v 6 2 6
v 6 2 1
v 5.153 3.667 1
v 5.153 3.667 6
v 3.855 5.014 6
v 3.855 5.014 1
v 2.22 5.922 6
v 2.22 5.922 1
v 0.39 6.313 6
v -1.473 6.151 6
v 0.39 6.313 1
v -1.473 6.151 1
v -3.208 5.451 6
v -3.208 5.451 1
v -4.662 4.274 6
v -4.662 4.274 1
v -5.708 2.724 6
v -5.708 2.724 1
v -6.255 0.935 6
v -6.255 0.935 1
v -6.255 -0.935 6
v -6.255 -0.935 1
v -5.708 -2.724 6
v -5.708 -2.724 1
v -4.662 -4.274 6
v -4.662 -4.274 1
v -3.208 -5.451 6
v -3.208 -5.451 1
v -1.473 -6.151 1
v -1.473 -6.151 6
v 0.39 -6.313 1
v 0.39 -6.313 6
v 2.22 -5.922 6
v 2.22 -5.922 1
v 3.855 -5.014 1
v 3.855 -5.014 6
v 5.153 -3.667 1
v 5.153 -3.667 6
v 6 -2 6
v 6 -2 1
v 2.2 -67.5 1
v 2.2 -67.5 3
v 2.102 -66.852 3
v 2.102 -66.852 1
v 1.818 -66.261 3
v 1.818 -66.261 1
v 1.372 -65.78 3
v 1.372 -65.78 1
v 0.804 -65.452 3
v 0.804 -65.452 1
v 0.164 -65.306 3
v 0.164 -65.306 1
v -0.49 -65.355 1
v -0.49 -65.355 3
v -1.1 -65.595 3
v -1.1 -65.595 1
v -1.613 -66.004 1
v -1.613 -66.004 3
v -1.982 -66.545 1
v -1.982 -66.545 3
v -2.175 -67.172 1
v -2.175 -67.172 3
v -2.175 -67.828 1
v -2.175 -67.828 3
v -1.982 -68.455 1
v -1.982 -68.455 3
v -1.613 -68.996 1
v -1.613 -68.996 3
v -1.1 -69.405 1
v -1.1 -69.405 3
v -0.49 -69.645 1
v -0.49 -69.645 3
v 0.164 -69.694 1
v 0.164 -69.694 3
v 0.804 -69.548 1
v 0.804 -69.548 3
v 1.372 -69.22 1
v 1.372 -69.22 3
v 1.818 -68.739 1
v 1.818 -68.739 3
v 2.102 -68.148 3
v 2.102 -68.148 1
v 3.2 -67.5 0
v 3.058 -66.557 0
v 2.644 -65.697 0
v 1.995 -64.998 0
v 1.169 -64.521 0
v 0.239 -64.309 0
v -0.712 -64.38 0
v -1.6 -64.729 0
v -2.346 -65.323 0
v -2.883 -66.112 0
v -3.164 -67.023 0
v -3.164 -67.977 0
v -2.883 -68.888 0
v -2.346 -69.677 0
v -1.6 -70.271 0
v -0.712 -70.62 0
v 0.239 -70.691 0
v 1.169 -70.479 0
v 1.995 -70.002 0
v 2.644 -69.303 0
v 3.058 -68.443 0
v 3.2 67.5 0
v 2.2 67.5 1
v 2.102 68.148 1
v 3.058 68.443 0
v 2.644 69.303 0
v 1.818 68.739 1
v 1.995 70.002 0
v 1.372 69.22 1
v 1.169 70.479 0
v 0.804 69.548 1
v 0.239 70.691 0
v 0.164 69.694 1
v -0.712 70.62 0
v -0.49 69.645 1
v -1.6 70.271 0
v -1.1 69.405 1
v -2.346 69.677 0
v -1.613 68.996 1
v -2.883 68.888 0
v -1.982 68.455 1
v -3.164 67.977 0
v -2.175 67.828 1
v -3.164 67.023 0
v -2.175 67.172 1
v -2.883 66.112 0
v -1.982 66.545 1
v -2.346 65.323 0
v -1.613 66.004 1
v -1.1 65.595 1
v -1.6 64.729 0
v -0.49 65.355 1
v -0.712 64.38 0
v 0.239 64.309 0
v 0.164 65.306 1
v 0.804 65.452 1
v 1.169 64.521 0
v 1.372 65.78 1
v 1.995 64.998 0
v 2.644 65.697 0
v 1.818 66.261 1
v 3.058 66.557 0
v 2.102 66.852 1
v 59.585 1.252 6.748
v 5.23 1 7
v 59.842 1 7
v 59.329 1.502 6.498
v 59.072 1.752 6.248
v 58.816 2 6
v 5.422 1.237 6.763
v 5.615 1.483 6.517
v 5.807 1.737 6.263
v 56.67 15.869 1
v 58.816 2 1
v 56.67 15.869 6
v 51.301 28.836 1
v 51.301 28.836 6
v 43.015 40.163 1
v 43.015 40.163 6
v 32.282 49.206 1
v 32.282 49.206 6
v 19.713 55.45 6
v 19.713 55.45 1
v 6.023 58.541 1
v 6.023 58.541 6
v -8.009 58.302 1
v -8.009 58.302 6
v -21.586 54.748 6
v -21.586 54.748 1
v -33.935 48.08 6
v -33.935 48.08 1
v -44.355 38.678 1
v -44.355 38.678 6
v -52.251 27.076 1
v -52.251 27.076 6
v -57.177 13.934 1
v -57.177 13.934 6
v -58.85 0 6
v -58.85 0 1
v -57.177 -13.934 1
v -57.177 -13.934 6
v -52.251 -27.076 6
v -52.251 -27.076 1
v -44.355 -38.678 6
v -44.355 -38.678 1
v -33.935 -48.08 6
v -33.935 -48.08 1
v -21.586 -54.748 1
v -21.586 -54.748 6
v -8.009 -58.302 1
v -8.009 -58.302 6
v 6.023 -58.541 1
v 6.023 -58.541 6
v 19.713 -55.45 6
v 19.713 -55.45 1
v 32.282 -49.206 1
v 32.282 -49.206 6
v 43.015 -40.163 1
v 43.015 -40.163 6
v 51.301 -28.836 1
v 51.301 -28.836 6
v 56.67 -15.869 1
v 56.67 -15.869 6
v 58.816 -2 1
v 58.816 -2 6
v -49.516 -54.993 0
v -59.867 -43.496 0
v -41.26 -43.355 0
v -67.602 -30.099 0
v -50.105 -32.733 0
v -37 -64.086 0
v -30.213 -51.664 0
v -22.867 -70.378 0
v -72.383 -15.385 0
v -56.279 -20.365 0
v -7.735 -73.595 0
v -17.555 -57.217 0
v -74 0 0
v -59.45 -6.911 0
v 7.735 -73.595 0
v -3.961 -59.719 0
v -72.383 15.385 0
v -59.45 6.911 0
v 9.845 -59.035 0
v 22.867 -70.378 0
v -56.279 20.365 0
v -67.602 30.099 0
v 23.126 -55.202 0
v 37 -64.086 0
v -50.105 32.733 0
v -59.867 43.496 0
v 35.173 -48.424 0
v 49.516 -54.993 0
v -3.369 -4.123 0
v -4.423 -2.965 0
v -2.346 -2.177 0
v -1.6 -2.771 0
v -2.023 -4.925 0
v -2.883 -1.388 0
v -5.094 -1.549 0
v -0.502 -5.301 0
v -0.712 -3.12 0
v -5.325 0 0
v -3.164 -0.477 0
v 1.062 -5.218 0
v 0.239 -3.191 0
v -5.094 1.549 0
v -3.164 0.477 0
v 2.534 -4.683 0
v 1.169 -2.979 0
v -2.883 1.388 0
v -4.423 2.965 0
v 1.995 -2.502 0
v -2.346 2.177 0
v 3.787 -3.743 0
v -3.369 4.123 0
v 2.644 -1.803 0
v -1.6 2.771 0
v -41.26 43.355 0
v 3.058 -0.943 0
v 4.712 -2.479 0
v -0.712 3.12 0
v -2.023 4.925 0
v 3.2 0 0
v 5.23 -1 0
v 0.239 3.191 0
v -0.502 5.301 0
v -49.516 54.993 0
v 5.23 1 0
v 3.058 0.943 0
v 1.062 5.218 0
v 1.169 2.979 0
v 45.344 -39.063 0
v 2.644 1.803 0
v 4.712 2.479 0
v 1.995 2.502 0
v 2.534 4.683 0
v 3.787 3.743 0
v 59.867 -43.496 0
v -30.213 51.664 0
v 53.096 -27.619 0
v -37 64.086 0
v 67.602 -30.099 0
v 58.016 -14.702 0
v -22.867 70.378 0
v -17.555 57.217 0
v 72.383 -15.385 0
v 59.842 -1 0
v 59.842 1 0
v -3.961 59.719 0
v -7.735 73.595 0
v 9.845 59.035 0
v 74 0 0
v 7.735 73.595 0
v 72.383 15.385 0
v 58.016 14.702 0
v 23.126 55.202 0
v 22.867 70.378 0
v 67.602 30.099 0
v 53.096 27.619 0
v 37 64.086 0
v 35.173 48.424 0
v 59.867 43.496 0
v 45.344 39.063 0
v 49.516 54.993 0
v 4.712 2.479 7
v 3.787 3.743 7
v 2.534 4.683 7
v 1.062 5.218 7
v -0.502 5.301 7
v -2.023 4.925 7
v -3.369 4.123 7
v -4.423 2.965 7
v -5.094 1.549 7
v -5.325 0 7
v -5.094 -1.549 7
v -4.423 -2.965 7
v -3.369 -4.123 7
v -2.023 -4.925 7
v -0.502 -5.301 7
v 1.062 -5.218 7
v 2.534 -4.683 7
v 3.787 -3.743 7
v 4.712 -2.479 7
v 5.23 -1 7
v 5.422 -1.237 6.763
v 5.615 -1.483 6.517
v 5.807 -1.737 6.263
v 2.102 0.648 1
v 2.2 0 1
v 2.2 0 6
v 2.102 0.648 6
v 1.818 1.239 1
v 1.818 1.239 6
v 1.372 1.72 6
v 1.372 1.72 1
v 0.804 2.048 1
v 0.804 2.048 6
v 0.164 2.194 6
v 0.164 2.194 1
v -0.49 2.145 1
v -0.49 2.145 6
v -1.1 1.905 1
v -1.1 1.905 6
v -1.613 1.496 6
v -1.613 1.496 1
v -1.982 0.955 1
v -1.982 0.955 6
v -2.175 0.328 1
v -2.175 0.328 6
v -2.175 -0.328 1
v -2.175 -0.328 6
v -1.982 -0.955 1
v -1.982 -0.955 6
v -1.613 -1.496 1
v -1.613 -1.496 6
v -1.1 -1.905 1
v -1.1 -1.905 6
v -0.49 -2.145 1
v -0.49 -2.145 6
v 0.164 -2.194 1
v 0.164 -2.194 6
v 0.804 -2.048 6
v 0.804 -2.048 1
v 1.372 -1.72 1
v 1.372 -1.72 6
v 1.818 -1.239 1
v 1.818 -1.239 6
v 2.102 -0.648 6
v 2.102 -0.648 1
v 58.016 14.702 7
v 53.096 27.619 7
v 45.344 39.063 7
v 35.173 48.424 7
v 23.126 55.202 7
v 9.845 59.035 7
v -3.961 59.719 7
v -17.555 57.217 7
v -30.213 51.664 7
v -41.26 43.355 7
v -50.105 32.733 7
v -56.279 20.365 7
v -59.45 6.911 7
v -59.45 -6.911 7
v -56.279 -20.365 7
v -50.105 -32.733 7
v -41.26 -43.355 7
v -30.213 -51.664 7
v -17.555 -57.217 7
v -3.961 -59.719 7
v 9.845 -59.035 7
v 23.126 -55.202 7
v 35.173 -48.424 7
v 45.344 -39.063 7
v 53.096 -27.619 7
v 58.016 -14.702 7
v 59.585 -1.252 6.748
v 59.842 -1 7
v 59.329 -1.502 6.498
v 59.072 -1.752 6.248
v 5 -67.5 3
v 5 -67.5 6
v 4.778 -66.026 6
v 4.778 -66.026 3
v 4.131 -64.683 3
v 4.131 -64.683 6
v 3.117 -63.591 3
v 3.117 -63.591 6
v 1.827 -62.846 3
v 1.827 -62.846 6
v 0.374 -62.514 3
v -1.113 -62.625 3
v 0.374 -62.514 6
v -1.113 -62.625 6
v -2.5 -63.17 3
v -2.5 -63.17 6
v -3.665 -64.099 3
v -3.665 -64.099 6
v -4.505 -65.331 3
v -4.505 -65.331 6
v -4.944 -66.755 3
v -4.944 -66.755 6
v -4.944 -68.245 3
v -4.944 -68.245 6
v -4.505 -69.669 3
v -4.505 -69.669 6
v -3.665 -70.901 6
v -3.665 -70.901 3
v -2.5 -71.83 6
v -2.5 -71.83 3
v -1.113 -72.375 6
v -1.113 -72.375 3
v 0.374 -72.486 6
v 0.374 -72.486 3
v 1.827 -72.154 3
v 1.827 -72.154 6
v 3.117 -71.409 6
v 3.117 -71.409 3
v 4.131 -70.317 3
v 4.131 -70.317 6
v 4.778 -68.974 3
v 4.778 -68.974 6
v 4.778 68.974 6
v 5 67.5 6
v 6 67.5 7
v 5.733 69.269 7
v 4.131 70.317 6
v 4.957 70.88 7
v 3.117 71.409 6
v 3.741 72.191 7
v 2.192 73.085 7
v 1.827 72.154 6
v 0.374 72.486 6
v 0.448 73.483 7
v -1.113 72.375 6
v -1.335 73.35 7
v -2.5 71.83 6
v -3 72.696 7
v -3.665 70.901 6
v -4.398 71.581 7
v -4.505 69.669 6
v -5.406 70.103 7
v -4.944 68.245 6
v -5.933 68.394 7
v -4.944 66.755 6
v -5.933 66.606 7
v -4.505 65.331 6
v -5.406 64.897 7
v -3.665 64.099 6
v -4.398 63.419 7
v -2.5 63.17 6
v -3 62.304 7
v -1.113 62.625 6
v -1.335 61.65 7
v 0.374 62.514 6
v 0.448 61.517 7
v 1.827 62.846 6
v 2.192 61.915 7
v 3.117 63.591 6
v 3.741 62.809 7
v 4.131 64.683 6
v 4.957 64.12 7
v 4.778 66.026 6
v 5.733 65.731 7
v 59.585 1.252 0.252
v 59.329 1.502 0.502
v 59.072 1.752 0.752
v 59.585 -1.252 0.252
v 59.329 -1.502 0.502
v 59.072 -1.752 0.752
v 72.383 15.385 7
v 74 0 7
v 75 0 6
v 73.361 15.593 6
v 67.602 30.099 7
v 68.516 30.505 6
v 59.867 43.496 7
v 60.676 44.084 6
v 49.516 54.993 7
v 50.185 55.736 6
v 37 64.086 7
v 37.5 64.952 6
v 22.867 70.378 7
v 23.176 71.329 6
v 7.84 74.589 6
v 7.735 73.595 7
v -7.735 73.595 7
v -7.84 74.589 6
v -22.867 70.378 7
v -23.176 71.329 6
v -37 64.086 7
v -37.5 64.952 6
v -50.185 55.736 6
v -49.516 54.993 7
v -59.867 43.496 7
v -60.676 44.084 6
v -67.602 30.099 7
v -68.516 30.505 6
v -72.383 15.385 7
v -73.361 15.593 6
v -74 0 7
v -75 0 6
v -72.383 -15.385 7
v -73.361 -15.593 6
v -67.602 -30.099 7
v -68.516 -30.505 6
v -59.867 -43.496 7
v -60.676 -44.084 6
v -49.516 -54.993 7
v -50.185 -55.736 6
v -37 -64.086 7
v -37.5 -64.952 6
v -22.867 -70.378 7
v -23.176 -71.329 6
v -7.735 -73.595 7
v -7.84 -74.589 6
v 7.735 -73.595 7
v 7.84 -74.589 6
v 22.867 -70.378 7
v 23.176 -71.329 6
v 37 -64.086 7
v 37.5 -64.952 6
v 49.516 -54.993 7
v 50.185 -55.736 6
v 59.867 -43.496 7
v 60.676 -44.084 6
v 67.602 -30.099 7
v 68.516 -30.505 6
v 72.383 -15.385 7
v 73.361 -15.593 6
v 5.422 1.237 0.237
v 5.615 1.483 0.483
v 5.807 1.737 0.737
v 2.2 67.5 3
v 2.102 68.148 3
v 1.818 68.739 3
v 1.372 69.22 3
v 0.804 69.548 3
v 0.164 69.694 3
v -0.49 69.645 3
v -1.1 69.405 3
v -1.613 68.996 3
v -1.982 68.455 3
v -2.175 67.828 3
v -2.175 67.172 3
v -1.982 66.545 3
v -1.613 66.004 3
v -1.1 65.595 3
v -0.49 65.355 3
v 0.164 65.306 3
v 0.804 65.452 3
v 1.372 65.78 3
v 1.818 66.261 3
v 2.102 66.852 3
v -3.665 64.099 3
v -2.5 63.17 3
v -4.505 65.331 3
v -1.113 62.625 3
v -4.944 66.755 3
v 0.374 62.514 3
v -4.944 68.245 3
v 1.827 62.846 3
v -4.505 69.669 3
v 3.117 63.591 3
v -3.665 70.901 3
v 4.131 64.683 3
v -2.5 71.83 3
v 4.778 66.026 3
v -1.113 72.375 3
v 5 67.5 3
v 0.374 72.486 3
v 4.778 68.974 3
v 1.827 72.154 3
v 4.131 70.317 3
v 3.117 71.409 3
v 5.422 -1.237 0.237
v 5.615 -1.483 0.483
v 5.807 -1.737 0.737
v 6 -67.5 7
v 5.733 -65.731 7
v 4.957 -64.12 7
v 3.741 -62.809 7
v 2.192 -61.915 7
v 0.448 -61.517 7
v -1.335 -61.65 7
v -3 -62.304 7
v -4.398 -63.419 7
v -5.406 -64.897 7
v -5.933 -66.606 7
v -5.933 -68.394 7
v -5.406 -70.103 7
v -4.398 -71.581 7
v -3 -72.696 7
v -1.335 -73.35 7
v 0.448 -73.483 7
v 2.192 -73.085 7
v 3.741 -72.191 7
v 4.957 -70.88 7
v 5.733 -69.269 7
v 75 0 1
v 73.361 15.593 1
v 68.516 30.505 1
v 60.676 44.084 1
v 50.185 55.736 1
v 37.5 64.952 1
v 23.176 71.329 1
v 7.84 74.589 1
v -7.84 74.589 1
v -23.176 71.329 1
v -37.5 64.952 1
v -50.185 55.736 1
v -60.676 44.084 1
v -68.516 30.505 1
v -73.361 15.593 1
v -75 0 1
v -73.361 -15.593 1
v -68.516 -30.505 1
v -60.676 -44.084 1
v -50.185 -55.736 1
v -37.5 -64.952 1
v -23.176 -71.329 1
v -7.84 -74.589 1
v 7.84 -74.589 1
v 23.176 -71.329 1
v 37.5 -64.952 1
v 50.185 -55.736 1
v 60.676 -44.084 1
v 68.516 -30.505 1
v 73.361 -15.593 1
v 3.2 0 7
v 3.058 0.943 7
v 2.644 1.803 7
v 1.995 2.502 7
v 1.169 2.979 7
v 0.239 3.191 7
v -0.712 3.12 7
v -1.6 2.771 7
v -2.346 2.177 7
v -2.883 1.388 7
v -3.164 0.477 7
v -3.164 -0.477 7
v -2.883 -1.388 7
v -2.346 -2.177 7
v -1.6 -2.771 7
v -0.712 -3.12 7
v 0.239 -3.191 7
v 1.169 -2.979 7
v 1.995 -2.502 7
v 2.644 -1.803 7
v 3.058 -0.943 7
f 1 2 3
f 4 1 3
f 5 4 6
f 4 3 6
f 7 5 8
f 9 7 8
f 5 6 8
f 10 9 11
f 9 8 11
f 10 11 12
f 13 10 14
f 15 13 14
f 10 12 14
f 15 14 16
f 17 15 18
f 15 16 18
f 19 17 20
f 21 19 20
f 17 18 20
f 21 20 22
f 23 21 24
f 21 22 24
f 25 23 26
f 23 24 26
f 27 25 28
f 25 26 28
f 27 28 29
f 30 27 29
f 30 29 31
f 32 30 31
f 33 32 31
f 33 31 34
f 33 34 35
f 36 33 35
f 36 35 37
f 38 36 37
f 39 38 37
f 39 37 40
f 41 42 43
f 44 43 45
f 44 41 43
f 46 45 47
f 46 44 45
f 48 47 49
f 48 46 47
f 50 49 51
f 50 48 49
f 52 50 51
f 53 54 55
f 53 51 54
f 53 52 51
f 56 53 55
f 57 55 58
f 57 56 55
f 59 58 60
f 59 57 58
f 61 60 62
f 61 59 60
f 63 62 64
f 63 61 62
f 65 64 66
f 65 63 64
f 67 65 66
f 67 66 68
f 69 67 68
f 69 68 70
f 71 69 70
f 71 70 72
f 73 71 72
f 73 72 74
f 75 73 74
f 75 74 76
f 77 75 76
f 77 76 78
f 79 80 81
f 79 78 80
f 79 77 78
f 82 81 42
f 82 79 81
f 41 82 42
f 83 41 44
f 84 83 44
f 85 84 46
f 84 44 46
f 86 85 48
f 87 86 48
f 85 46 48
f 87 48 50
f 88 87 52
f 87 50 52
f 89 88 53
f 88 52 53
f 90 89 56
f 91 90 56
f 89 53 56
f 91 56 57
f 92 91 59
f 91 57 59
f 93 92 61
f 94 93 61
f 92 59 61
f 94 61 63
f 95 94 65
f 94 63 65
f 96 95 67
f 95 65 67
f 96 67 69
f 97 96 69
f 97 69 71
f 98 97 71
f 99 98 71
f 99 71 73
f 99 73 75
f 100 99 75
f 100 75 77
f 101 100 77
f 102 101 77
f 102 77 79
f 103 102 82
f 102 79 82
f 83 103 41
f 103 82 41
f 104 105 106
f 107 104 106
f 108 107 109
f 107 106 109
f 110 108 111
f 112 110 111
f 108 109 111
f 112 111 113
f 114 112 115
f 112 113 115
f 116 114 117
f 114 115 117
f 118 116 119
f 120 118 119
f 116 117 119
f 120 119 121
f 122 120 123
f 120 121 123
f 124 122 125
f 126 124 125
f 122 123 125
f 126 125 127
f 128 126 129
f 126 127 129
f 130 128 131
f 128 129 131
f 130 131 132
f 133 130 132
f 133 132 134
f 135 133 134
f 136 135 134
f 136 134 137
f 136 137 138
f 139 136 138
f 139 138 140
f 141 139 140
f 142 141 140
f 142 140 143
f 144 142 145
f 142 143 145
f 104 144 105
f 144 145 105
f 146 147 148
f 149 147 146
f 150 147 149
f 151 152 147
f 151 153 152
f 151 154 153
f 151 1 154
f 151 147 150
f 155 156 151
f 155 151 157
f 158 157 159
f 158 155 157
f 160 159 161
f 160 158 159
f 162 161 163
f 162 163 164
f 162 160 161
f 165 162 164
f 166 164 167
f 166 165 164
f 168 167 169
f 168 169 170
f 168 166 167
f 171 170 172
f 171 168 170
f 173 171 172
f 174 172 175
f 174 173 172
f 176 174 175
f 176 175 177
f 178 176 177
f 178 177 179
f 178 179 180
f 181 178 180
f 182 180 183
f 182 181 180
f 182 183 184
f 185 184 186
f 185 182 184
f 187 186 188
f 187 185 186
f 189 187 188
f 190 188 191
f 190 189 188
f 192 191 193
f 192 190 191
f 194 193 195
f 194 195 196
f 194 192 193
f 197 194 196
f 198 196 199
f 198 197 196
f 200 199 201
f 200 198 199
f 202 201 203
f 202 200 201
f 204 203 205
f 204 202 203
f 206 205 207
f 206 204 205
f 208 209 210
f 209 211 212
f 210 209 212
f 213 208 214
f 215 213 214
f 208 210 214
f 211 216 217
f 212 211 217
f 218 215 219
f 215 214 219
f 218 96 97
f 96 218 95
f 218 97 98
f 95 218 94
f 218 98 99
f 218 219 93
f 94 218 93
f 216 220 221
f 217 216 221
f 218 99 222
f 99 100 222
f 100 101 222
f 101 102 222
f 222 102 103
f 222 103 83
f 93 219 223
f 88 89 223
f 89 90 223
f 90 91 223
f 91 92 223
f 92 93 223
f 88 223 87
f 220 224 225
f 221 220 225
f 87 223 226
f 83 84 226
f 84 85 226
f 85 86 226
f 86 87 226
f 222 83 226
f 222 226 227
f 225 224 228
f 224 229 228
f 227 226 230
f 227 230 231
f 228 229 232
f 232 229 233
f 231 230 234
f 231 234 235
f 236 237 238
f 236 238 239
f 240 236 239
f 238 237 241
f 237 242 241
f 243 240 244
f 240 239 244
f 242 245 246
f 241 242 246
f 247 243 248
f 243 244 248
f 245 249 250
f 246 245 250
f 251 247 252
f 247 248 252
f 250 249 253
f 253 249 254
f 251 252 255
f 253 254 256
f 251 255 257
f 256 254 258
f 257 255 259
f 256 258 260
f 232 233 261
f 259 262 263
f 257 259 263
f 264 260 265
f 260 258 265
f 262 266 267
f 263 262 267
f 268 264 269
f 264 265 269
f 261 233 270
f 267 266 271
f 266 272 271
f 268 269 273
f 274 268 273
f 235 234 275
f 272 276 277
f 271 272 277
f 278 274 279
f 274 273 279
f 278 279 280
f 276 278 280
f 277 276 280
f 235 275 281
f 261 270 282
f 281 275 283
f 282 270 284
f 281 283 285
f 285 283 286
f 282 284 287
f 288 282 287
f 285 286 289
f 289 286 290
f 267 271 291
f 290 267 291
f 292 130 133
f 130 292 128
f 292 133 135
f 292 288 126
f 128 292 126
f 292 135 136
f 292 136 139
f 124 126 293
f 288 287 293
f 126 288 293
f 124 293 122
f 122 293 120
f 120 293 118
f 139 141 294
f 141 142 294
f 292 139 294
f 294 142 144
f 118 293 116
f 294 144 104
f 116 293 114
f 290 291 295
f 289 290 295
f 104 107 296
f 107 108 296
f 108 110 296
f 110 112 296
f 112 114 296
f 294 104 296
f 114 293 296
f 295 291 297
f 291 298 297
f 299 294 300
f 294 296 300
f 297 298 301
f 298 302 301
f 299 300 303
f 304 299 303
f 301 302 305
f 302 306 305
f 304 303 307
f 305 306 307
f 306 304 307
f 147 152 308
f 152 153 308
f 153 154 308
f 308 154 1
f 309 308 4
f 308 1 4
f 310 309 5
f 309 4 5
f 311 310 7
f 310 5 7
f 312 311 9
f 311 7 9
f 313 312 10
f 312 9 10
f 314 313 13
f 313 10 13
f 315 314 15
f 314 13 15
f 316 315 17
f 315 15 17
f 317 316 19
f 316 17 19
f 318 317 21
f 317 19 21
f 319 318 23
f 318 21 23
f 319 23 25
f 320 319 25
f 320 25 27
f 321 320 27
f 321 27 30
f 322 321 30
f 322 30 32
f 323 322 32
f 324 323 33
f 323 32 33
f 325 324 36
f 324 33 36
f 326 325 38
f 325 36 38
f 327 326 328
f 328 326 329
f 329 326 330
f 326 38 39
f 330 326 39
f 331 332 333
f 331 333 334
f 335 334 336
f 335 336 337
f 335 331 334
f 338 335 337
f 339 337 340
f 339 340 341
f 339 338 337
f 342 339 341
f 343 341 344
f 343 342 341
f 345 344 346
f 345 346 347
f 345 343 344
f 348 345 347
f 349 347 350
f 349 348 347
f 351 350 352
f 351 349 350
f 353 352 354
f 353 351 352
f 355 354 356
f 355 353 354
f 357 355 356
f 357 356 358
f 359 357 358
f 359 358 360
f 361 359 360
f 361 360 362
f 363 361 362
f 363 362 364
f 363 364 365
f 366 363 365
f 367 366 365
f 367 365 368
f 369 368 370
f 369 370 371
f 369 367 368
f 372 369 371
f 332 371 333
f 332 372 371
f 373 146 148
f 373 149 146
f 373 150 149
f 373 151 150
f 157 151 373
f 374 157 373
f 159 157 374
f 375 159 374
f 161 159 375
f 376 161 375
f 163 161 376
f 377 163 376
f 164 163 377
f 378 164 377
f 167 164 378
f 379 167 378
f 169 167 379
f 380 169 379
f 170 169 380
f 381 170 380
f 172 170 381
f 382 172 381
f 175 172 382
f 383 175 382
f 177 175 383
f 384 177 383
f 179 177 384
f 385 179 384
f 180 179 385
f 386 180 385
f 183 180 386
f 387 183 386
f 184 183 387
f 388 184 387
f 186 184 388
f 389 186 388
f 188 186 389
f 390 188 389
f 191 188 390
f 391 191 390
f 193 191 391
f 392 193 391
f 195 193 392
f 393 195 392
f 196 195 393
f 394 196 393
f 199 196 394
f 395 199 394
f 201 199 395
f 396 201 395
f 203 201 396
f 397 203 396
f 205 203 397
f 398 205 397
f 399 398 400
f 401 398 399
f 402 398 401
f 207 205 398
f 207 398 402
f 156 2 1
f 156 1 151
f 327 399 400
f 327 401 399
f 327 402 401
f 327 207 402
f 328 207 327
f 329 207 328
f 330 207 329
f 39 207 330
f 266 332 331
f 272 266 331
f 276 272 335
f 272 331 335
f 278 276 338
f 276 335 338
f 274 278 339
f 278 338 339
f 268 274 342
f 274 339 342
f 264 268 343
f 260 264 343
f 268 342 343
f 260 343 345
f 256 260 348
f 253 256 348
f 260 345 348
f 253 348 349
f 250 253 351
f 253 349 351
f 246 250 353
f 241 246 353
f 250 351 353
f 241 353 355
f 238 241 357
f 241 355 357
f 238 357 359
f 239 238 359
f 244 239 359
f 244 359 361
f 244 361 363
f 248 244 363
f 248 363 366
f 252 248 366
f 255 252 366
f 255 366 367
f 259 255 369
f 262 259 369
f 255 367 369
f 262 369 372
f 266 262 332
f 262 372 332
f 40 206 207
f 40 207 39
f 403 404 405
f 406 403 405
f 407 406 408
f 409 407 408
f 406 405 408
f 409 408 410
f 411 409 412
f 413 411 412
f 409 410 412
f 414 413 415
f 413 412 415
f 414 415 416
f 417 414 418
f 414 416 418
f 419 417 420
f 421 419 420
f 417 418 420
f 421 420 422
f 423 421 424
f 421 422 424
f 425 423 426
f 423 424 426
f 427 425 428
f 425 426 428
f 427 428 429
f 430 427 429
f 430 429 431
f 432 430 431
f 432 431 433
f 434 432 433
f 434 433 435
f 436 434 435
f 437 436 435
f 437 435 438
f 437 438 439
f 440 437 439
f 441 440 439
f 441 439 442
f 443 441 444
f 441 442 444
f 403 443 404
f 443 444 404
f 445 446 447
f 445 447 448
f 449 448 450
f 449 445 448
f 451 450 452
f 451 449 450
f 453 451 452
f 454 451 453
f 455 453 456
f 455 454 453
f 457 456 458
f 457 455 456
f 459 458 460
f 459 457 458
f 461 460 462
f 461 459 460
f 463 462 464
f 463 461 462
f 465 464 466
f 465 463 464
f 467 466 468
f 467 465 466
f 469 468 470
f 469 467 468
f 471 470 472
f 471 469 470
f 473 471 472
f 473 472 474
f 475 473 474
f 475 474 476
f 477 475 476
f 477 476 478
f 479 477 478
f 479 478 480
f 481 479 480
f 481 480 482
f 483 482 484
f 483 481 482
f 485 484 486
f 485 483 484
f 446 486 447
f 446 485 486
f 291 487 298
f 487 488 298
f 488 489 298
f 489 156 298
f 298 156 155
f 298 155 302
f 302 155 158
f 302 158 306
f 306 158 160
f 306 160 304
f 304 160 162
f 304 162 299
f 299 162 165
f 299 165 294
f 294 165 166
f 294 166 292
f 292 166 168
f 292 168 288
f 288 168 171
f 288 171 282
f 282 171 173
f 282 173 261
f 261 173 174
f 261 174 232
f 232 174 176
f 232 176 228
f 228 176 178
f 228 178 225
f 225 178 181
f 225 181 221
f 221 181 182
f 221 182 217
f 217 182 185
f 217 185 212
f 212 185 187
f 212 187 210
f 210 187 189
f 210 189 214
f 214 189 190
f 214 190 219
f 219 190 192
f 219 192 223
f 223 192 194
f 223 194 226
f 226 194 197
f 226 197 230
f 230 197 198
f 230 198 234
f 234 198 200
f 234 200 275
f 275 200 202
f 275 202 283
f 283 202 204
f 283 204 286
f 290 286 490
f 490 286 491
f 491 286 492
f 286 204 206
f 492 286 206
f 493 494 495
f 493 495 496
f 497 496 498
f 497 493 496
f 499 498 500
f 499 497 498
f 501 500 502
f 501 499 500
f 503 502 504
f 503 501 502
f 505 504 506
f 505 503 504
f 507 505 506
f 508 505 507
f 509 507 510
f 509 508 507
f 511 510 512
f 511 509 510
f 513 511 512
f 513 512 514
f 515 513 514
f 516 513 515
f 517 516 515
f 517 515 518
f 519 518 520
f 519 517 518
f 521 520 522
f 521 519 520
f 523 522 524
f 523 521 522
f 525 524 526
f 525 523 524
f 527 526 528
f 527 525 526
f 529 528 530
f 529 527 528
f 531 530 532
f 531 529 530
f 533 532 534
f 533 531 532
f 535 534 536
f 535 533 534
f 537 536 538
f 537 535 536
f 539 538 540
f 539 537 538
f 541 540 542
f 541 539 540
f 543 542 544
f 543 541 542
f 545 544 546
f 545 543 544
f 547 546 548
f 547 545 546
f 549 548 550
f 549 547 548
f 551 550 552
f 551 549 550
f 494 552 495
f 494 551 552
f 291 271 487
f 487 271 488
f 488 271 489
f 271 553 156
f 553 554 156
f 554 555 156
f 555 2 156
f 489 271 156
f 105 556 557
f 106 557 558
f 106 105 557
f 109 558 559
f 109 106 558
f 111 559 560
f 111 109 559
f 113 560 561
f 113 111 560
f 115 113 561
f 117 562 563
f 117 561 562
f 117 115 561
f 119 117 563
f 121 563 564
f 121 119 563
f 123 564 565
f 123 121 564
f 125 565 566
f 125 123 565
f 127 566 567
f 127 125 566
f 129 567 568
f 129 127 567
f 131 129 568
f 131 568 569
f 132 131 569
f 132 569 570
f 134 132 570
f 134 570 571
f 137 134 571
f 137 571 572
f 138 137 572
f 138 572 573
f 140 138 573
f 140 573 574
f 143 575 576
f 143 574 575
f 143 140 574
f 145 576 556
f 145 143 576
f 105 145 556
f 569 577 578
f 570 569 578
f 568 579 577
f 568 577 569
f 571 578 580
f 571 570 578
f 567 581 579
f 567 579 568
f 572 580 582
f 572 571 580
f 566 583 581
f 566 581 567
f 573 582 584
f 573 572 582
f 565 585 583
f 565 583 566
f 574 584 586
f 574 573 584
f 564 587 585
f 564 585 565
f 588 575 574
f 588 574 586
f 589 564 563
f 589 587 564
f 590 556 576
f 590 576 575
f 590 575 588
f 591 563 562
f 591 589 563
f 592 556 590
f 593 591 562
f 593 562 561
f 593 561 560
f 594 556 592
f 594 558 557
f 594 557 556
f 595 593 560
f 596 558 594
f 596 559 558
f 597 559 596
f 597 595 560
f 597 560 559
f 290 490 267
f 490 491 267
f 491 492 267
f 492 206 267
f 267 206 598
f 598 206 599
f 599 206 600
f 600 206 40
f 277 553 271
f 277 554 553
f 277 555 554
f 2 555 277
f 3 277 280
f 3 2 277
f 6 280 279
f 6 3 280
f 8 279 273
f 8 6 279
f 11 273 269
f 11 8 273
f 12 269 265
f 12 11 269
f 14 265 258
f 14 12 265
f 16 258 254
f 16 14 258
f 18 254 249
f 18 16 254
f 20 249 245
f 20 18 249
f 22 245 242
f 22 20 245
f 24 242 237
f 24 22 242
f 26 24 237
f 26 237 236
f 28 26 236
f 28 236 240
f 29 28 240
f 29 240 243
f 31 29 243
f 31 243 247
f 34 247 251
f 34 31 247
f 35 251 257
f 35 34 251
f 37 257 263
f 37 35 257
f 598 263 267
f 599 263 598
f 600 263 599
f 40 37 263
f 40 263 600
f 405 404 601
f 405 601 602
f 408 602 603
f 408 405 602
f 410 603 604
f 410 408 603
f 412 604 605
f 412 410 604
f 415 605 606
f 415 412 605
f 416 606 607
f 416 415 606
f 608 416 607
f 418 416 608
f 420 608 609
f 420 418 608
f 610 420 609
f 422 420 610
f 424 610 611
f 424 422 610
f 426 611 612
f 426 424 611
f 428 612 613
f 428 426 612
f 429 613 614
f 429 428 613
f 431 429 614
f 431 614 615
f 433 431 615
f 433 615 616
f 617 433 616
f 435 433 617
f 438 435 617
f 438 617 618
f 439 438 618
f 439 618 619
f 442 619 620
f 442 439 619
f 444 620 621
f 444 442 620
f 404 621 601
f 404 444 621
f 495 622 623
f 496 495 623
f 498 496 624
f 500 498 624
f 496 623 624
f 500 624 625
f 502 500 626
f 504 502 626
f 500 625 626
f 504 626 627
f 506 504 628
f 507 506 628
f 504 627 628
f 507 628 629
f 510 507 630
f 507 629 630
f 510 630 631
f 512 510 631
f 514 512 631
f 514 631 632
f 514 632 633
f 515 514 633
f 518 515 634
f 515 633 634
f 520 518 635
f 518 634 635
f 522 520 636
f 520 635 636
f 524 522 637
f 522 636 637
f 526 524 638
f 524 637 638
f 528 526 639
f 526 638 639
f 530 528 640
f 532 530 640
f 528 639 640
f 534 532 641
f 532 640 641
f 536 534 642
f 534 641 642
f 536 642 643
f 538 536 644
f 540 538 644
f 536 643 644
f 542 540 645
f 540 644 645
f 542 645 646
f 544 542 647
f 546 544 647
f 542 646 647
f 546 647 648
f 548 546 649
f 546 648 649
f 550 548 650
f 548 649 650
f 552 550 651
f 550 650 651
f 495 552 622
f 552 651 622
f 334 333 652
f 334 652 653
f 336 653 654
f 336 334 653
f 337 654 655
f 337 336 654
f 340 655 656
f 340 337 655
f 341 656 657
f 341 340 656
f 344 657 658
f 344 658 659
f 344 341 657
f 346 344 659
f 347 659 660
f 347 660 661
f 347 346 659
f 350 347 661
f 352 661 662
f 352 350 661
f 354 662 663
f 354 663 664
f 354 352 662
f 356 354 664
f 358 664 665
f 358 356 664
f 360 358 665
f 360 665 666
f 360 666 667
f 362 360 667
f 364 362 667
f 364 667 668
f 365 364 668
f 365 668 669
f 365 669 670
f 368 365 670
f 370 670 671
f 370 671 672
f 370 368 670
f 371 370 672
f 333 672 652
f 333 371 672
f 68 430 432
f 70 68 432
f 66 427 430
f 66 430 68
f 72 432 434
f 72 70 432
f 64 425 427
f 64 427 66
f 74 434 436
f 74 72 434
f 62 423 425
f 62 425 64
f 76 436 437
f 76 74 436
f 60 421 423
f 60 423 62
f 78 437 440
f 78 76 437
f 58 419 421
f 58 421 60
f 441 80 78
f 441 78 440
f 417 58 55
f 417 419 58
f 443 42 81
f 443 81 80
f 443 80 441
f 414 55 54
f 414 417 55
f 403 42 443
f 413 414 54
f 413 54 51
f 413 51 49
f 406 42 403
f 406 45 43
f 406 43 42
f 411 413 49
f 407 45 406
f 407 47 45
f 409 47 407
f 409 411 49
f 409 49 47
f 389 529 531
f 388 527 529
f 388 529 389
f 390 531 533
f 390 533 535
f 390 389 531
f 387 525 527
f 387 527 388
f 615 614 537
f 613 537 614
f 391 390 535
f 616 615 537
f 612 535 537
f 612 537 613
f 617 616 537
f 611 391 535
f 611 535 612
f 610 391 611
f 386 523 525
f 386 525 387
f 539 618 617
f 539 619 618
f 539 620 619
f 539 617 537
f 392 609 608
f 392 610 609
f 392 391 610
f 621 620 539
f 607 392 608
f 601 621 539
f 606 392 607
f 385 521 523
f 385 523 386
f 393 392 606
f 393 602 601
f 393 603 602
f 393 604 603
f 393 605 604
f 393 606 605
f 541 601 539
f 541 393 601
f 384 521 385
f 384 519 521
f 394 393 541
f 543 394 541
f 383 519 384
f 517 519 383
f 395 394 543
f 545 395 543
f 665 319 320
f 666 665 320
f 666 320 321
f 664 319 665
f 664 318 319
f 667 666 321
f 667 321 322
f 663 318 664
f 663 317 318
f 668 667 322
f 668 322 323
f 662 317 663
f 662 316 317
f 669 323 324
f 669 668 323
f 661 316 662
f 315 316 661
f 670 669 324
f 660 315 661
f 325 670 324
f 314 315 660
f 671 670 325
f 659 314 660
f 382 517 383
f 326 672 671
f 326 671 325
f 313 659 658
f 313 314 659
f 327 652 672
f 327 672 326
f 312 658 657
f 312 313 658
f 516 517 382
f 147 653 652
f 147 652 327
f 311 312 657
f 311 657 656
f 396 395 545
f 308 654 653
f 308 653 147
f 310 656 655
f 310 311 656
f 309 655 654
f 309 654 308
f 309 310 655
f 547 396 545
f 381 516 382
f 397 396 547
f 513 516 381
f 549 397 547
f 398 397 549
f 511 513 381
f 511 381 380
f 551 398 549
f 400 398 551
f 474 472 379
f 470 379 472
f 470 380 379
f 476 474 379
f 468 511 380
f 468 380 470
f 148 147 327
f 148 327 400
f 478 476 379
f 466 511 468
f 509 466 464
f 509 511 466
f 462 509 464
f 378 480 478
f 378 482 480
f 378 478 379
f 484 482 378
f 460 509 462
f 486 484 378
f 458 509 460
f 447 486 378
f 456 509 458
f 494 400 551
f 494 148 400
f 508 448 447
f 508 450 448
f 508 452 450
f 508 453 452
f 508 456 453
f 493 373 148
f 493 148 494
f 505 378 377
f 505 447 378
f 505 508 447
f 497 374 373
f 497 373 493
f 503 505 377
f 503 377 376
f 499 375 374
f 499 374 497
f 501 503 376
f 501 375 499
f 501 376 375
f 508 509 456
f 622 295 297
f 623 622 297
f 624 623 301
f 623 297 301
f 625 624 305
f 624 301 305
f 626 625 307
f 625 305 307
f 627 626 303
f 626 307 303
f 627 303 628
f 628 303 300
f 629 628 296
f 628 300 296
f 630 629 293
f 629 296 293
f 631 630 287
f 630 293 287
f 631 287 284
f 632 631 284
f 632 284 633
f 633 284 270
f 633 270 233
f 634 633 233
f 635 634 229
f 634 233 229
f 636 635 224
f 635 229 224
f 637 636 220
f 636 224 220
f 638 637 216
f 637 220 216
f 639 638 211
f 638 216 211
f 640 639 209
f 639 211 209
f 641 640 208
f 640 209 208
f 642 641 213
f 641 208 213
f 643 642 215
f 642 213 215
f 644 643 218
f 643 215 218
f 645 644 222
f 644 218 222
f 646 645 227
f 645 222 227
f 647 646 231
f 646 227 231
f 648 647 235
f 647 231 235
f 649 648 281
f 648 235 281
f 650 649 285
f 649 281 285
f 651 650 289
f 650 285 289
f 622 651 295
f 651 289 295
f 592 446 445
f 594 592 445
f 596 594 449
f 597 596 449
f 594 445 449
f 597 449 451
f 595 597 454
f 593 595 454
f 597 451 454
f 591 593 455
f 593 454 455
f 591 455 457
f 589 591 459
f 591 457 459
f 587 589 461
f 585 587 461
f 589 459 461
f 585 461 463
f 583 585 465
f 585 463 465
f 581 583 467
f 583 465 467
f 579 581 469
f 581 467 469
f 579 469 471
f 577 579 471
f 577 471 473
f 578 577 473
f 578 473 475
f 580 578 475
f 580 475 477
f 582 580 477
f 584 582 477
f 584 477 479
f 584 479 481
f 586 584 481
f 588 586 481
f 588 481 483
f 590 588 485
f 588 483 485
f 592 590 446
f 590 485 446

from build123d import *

# Parameters (mm, degrees)
SKETCH004_R     = 75
SKETCH004_R_2   = 2.2
PAD003_DEPTH    = 7
SKETCH005_R     = 5
POCKET001_DEPTH = 4
CHAMFER003_SIZE = 1


with BuildPart() as part:
    # Sketch004 → Pad003 (new body)
    with BuildSketch(Plane.XY):
        Circle(SKETCH004_R)
        Circle(SKETCH004_R_2, mode=Mode.SUBTRACT)
        with Locations((0, 67.5)):
            Circle(SKETCH004_R_2, mode=Mode.SUBTRACT)
        with Locations((0, -67.5)):
            Circle(SKETCH004_R_2, mode=Mode.SUBTRACT)
        with BuildLine():
            ThreePointArc((58.816005, 2), (-58.85, 0), (58.816005, -2))
            Line((58.816005, -2), (6, -2))
            ThreePointArc((6, 2), (-6.324555, 0), (6, -2))
            Line((6, 2), (58.816005, 2))
        make_face(mode=Mode.SUBTRACT)
    extrude(amount=PAD003_DEPTH)

    # Sketch005 (on Face10 of Pad003) → Pocket001 (cut)
    with BuildSketch(Plane.XY.offset(7)):
        with Locations((0, 67.5)):
            Circle(SKETCH005_R)
        with Locations((0, -67.5)):
            Circle(SKETCH005_R)
    extrude(amount=-POCKET001_DEPTH, mode=Mode.SUBTRACT)

    # Chamfer003
    chamfer003_edges = [part.edges().sort_by_distance(p)[0] for p in [
        (-75, 0, 7),
        (-5, -67.5, 7),
        (32.408003, 2, 7),
        (-6.324555, 0, 7),
        (-58.85, 0, 7),
        (32.408003, -2, 7),
        (-2.2, 0, 7),
        (-5, 67.5, 7),
        (-75, 0, 0),
        (32.408003, 2, 0),
        (-58.85, 0, 0),
        (32.408003, -2, 0),
        (-6.324555, 0, 0),
        (-2.2, -67.5, 0),
        (-2.2, 67.5, 0),
        (-2.2, 0, 0),
    ]]
    chamfer(chamfer003_edges, length=CHAMFER003_SIZE)


solid = part.part
